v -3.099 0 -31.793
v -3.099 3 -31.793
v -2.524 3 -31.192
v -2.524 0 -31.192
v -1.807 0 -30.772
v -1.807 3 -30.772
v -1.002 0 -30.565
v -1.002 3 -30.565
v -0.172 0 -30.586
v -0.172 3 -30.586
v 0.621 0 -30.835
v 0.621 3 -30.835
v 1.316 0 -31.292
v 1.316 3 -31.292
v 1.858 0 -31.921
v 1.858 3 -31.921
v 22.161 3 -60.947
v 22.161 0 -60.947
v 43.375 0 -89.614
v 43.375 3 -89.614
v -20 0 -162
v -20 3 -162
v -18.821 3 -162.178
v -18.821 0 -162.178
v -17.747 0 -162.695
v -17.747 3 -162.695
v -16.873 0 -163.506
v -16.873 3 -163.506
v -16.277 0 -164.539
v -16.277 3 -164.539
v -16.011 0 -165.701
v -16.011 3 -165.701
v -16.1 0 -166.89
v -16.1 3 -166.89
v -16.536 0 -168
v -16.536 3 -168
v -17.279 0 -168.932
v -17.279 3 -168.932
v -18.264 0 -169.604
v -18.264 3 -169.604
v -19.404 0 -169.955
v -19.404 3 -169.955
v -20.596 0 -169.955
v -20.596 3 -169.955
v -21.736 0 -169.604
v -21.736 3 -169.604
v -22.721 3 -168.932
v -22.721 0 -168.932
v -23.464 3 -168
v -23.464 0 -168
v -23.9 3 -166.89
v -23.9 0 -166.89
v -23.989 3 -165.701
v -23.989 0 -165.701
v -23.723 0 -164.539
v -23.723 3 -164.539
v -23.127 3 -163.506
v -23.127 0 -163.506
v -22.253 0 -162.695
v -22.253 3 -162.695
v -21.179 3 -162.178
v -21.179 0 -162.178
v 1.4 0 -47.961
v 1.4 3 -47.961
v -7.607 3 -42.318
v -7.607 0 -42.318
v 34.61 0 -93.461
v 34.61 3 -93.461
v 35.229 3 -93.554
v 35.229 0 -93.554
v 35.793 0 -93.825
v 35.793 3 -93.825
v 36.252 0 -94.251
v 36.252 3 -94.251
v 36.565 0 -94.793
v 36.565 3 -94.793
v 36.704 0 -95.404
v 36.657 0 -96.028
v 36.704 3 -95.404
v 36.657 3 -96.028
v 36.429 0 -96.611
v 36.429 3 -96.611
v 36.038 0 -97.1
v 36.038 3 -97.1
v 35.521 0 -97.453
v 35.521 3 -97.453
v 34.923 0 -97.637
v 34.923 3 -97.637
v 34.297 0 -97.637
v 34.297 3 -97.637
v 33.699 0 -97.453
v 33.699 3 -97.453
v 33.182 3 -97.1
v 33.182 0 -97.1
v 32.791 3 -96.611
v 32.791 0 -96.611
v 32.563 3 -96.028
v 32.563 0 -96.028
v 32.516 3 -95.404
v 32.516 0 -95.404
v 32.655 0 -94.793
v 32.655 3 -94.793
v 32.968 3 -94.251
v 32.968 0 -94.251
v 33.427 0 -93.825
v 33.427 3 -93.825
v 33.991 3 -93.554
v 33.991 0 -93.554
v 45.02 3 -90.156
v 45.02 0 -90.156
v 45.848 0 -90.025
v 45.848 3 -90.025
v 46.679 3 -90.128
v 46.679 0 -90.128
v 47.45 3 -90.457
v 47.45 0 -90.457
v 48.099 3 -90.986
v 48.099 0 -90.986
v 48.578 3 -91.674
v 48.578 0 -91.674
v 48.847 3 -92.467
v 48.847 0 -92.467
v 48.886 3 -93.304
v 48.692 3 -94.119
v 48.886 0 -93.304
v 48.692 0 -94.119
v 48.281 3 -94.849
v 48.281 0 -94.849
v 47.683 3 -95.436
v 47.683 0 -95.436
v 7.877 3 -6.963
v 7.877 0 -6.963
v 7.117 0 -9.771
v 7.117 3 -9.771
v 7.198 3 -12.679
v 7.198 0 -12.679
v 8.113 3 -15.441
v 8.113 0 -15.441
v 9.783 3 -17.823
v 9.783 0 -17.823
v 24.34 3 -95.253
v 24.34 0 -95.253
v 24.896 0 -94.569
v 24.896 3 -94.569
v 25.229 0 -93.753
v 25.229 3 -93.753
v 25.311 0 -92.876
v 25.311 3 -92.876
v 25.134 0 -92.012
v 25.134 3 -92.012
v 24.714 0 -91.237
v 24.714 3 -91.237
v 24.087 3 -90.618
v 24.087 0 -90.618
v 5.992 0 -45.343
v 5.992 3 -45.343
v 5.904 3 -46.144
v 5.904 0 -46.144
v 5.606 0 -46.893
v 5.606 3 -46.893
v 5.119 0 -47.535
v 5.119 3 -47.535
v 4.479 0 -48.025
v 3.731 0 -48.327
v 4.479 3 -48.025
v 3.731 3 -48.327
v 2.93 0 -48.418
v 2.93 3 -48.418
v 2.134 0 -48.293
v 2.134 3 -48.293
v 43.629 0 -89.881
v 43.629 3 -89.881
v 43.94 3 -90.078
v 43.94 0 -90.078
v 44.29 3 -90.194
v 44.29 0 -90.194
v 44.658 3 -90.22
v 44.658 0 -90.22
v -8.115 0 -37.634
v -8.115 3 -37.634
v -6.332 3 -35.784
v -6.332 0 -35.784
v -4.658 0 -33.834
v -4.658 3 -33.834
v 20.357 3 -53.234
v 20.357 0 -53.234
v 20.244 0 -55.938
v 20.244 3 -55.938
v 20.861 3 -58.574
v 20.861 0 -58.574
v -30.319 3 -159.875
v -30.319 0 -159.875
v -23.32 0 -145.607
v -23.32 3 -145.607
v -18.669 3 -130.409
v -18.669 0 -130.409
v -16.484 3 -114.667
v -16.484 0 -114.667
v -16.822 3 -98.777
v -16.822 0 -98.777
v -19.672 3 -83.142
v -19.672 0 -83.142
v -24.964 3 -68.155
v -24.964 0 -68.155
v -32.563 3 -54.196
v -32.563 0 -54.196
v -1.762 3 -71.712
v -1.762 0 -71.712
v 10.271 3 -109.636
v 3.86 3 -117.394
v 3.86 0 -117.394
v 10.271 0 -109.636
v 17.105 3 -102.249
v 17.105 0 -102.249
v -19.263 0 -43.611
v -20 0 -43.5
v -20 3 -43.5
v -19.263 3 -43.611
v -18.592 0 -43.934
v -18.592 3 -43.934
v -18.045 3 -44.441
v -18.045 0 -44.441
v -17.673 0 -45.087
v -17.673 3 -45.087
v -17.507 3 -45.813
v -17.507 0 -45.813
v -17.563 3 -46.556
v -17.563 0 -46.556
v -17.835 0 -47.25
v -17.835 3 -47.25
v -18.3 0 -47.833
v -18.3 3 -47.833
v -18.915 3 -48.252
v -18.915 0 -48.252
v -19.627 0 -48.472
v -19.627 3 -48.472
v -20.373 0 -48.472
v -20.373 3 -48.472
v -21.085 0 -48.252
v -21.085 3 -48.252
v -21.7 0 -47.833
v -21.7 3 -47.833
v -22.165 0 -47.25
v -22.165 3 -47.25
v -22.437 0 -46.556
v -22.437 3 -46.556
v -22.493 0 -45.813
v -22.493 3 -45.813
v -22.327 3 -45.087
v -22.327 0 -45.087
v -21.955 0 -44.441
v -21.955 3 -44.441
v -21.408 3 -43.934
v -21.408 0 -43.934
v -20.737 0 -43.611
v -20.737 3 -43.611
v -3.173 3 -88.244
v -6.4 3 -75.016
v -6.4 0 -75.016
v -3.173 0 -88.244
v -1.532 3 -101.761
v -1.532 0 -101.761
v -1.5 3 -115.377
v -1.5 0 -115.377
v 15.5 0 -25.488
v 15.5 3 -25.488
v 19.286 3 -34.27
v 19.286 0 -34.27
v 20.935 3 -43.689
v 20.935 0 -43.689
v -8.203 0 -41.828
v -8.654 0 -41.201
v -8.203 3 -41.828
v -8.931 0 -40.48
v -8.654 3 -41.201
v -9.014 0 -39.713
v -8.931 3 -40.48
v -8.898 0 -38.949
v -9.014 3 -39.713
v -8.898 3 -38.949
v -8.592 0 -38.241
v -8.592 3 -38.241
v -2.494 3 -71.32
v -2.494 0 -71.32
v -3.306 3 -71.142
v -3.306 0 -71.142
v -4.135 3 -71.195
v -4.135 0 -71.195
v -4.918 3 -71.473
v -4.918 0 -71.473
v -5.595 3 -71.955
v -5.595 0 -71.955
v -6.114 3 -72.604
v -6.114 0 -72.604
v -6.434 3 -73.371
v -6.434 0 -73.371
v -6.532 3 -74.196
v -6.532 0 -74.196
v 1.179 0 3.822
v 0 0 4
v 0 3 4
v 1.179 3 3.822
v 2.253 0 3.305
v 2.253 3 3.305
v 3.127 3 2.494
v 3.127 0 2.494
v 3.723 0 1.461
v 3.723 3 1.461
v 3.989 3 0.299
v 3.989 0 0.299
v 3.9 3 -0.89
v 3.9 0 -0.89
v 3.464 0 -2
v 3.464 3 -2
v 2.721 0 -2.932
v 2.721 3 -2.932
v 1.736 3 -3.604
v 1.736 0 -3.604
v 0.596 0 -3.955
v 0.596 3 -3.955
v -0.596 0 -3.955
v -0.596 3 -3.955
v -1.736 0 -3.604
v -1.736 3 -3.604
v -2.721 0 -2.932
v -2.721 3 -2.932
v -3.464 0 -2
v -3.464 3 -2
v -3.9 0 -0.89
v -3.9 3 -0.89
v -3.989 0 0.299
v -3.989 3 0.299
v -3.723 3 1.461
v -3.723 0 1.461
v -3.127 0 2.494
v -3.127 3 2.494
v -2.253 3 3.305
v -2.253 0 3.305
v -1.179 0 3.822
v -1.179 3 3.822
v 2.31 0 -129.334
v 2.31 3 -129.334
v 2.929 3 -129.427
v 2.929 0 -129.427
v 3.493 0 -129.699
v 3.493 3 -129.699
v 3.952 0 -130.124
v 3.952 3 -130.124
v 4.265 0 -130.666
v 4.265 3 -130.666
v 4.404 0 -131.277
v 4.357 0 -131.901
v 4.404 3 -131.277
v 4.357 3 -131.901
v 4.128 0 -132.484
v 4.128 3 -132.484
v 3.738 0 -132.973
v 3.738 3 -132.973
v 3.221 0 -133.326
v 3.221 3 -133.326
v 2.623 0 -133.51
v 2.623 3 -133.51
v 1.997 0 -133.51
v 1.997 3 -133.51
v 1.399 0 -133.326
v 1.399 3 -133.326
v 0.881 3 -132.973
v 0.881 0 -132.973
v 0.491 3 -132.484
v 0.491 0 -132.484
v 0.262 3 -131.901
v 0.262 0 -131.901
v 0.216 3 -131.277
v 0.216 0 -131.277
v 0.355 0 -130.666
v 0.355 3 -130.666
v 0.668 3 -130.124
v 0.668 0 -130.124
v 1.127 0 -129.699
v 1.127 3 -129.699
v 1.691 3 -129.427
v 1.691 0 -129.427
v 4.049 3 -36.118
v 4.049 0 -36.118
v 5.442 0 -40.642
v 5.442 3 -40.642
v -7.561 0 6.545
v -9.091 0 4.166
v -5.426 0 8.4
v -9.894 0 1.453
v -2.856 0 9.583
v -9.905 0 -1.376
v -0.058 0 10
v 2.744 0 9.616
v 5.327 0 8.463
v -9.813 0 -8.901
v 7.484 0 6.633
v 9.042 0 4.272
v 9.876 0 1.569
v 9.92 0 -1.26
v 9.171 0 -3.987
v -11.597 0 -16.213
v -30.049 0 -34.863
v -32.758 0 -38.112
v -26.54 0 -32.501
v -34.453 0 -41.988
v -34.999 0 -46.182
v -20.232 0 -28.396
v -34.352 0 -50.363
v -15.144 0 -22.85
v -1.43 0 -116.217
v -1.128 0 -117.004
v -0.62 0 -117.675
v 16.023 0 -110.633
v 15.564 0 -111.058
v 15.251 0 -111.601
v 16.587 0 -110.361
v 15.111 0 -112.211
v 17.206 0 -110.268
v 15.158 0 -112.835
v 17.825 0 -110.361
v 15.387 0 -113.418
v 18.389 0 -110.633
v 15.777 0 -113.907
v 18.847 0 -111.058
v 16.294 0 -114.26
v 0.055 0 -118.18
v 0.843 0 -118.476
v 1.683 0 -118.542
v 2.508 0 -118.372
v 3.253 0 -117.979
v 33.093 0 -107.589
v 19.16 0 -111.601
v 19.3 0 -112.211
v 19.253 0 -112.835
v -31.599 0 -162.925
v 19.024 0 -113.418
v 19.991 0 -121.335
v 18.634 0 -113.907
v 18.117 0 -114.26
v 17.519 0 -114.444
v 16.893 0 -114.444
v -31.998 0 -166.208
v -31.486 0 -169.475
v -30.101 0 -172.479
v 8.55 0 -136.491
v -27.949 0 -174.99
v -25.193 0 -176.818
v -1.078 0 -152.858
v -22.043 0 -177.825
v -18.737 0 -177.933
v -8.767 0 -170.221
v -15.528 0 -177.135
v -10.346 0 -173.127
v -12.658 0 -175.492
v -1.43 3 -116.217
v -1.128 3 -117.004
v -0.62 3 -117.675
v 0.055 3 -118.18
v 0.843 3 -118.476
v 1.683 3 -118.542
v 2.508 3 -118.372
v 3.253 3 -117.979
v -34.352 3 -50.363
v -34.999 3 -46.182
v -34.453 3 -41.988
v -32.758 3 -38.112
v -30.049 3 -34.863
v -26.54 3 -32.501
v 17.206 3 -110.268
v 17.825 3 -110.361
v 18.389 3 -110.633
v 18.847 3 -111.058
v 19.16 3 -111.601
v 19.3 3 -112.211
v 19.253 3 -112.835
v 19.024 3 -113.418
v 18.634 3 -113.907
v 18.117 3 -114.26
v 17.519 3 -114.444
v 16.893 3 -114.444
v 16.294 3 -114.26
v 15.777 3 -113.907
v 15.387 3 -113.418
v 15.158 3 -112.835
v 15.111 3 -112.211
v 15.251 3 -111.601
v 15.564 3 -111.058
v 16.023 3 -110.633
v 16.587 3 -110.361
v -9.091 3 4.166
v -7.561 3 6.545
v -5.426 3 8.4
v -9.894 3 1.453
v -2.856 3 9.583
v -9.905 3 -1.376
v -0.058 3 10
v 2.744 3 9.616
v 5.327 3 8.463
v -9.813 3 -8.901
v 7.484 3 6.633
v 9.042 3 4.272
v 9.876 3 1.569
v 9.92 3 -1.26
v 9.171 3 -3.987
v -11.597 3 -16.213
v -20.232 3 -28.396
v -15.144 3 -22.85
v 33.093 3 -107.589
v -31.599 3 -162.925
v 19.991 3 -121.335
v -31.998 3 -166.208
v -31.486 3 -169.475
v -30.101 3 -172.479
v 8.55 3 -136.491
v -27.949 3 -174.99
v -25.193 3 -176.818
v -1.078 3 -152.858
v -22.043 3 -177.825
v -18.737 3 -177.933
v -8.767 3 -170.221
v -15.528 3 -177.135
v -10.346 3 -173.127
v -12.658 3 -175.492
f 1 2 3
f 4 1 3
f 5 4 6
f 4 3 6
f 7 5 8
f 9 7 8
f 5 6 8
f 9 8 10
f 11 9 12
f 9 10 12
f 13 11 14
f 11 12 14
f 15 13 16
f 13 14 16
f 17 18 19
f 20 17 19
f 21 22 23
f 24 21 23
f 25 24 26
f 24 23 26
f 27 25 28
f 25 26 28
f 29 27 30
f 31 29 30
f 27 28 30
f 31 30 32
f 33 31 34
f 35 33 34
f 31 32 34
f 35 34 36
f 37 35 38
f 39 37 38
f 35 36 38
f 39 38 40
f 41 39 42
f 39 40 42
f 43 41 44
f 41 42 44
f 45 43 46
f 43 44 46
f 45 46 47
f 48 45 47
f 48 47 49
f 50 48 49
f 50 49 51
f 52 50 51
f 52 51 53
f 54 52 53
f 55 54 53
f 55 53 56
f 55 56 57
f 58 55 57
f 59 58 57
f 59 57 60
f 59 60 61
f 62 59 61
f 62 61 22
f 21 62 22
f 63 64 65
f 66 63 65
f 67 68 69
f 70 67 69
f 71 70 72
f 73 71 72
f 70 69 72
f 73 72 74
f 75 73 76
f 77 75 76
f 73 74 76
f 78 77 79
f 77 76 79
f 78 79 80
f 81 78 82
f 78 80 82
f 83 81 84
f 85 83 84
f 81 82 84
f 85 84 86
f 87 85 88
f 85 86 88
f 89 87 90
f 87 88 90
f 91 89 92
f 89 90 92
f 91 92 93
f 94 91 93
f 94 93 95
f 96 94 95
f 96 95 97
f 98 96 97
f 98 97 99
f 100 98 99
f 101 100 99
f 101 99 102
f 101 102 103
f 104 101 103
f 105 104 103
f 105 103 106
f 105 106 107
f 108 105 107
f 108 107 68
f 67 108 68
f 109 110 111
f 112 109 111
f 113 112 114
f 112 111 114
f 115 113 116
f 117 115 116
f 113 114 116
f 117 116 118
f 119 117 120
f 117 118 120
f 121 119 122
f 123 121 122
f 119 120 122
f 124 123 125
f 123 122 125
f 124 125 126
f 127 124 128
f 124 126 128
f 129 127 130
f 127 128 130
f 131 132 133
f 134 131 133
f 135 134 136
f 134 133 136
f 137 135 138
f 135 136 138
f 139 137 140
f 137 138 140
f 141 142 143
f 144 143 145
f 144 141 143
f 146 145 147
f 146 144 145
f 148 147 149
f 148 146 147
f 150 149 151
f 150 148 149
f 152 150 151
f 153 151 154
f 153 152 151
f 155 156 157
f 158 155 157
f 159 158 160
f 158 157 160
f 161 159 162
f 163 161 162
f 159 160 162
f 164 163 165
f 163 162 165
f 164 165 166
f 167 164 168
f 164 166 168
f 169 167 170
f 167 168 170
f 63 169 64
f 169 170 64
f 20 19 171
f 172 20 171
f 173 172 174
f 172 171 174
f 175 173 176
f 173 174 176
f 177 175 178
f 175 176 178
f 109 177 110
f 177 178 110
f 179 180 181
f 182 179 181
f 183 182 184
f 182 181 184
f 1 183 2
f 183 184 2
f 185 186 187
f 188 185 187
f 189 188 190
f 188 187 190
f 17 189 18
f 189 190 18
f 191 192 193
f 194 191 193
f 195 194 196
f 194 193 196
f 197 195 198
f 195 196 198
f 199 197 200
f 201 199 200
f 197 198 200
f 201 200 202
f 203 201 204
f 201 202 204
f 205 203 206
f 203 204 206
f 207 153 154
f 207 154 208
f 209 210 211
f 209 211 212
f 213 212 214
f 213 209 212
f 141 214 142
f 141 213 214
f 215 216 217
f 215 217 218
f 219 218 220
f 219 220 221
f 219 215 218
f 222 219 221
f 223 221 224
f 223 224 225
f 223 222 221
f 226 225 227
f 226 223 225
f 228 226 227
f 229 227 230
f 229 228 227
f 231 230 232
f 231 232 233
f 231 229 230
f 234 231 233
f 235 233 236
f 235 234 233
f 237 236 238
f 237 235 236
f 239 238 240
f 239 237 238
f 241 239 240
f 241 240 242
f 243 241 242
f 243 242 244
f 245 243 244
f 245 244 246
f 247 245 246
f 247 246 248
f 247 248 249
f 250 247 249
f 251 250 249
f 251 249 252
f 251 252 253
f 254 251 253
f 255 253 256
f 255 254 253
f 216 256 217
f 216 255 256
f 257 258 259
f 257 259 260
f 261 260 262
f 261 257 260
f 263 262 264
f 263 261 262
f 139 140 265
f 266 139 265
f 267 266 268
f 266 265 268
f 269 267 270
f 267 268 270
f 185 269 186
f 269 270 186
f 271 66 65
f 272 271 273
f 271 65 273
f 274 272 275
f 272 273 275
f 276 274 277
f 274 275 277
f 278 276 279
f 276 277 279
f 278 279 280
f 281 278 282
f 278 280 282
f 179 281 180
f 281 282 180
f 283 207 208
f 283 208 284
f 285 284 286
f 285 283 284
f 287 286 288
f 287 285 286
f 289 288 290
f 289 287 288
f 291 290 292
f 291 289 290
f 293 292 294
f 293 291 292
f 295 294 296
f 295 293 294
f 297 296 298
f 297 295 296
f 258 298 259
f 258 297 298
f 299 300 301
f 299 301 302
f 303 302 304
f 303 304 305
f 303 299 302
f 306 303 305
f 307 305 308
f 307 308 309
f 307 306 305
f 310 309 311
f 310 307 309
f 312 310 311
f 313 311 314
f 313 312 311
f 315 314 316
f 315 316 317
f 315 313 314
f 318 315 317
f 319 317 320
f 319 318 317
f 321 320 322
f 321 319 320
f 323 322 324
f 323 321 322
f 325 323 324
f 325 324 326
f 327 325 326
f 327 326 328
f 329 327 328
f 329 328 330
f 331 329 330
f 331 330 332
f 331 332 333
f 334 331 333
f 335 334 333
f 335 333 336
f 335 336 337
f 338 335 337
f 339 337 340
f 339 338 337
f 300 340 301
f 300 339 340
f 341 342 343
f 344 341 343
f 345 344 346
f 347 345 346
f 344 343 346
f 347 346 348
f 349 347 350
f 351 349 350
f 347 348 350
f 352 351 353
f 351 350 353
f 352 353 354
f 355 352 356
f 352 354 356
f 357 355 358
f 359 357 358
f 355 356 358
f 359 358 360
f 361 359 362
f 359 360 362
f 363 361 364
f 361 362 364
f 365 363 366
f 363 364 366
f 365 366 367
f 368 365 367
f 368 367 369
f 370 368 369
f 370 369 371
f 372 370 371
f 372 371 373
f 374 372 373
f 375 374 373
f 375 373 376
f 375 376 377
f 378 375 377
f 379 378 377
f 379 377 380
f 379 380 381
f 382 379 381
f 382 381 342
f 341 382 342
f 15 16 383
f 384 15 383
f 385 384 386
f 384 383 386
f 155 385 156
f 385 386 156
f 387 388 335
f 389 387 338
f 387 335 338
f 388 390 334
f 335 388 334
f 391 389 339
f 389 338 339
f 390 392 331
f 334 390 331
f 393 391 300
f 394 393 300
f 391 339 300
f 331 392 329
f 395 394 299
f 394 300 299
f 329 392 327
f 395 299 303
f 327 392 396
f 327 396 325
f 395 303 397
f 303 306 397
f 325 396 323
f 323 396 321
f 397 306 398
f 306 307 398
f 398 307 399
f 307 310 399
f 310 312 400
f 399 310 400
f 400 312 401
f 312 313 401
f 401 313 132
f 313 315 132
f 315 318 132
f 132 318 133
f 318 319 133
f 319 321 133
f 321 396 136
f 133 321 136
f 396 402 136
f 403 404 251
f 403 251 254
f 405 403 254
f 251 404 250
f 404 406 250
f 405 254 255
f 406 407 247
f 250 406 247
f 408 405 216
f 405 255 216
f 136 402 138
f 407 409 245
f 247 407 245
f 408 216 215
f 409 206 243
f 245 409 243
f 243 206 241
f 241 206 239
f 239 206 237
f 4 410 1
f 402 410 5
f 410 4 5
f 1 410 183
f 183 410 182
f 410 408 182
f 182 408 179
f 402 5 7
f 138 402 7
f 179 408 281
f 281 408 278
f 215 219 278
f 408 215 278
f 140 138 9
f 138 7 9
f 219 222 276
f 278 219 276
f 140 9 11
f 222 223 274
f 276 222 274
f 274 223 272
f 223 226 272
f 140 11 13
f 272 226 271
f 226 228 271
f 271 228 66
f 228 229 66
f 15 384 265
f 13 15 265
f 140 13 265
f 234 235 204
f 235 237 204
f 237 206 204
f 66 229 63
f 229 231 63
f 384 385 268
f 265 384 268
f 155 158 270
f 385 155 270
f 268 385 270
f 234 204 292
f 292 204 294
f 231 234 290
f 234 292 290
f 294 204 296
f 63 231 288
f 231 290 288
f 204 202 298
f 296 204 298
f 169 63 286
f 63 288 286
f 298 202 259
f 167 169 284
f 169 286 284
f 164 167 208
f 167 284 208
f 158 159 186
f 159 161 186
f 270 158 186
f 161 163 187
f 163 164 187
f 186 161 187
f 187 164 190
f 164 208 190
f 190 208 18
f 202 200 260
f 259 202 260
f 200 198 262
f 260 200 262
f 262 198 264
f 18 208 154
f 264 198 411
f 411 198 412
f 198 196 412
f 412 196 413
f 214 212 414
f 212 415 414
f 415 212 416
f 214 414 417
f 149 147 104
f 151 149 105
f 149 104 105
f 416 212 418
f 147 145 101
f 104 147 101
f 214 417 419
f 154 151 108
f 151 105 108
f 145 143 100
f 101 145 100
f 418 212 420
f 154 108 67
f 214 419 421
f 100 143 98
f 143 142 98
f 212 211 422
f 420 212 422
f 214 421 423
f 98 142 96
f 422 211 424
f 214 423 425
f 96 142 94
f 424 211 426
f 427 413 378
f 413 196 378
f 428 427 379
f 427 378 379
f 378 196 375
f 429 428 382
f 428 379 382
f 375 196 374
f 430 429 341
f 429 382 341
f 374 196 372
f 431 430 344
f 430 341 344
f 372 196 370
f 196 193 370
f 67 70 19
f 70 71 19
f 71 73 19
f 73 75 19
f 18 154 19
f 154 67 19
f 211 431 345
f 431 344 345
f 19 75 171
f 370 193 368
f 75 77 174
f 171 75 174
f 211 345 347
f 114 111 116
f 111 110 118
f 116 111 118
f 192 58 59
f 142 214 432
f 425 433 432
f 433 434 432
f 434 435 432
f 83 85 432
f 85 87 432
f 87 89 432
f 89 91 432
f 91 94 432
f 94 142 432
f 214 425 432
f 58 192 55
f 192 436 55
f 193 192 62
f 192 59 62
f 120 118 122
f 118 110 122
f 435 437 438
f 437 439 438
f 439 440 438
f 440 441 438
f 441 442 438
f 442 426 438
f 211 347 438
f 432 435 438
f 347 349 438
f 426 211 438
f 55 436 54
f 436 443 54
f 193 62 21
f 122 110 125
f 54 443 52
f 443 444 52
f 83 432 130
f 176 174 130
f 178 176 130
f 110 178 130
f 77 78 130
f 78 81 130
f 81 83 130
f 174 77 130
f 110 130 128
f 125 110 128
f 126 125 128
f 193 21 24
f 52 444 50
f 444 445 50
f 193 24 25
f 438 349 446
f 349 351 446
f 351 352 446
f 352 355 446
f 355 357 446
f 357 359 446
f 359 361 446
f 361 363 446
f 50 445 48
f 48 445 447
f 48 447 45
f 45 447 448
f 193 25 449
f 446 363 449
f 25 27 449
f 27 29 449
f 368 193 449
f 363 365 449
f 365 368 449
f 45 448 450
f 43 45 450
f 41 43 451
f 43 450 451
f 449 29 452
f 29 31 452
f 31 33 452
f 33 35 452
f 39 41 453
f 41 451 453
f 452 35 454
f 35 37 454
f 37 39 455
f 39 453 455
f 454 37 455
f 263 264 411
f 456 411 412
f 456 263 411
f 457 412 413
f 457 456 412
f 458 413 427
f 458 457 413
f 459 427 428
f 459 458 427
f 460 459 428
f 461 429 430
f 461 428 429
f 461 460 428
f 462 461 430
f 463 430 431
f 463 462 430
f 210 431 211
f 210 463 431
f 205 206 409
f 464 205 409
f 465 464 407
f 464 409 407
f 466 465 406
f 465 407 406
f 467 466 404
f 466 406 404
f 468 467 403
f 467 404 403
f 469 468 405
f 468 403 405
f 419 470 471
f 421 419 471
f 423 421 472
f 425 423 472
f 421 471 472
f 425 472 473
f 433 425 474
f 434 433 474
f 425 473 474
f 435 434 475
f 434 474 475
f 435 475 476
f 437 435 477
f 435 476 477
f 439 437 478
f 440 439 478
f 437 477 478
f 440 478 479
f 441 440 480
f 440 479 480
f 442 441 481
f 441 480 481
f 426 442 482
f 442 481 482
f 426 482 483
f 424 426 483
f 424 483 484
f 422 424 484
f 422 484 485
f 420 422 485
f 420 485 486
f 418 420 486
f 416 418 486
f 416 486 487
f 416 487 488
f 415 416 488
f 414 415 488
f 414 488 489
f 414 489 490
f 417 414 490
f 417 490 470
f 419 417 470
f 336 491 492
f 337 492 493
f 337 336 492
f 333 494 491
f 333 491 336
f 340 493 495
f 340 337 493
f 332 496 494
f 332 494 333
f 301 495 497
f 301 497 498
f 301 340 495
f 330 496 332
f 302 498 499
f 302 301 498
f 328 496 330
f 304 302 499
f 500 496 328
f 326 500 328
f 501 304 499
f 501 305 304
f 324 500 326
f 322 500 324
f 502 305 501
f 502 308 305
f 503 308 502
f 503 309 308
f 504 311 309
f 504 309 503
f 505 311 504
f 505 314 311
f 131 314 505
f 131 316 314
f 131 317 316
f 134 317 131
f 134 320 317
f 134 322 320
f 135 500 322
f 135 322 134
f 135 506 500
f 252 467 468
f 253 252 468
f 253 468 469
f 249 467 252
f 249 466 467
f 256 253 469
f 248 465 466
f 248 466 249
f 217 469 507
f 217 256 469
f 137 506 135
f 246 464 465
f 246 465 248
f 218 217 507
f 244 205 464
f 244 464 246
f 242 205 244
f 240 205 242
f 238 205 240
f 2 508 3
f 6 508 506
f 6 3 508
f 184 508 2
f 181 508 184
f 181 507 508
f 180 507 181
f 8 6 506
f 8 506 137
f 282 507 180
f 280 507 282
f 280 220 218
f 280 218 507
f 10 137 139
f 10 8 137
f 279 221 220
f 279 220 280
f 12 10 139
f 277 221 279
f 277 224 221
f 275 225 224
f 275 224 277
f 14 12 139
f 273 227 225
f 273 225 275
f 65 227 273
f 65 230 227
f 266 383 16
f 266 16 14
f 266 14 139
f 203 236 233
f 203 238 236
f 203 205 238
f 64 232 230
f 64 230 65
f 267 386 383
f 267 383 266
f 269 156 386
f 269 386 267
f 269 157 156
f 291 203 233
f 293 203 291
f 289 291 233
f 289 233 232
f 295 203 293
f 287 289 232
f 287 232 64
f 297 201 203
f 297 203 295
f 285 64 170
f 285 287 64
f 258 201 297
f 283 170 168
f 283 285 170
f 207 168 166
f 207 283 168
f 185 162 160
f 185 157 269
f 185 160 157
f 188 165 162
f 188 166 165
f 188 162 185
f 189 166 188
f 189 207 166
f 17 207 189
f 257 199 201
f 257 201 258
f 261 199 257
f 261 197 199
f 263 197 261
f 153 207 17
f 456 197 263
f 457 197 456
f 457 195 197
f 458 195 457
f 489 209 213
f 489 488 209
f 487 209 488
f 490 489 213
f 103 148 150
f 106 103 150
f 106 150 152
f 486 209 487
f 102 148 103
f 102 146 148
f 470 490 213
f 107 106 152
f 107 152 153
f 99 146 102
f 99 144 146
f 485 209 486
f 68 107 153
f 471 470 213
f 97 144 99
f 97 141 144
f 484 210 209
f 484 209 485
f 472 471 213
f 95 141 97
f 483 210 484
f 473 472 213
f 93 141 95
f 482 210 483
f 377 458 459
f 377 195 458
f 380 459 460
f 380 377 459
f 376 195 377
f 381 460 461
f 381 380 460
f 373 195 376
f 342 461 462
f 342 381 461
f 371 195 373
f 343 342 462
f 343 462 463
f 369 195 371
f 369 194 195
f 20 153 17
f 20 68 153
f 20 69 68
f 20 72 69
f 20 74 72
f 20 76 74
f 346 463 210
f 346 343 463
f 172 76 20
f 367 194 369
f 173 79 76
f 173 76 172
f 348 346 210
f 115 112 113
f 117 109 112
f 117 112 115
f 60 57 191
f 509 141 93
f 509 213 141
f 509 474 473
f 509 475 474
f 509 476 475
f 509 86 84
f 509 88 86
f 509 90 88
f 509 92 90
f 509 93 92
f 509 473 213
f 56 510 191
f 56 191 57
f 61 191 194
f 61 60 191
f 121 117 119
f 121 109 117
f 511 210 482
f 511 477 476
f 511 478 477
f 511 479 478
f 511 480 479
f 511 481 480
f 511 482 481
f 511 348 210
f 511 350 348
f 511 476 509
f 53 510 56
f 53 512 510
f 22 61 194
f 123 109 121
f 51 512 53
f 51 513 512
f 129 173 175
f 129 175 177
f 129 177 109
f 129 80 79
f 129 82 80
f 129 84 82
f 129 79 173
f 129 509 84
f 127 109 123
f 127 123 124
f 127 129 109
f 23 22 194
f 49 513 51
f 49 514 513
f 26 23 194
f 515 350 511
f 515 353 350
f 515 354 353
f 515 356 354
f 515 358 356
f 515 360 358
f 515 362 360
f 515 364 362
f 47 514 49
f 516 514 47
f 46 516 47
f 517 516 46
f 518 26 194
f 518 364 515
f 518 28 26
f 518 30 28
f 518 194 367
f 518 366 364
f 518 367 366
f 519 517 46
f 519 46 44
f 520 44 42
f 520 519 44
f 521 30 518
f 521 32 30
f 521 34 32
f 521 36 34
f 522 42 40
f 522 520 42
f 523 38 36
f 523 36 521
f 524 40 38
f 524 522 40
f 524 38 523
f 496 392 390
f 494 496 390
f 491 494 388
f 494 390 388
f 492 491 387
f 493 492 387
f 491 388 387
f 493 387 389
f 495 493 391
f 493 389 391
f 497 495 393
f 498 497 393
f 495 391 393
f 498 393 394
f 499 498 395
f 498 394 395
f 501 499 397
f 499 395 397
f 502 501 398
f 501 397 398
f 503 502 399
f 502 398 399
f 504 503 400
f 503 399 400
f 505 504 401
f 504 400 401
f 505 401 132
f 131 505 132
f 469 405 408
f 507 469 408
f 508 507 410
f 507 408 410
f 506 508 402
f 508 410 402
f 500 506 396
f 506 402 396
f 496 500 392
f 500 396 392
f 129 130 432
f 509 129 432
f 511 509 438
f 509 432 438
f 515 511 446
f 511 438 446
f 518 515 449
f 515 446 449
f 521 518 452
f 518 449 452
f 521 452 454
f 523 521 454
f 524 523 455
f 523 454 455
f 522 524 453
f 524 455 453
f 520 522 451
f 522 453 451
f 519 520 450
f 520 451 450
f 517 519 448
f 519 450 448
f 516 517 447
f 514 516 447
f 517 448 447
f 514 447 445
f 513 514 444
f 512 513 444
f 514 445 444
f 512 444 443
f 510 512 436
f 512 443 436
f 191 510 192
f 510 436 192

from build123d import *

# Parameters (mm, degrees)
SKETCH1_R           = 4
SKETCH1_R_2         = 2.5
BOSS_EXTRUDE2_DEPTH = 3
CUT_EXTRUDE2_REACH  = 186.619
SKETCH2_R           = 4
CUT_EXTRUDE3_REACH  = 186.619
SKETCH3_R           = 2.1


with BuildPart() as part:
    # Sketch1 → Boss-Extrude2 (new body)
    with BuildSketch(Plane(origin=(0, 0, 0), x_dir=(1, 0, 0), z_dir=(0, 1, 0))):
        with BuildLine():
            Line((9.170700563, 3.987261114), (7.876862883, 6.963087778))
            ThreePointArc((7.876862883, 6.963087778), (7.198186925, 12.679447551), (9.783335319, 17.822829502))
            ThreePointArc((9.783335319, 17.822829502), (19.286109016, 34.269627525), (20.356745206, 53.234163146))
            ThreePointArc((20.356745206, 53.234163146), (20.462846426, 57.276901224), (22.161434095, 60.947022282))
            Line((22.161434095, 60.947022282), (43.375248586, 89.614346273))
            ThreePointArc((43.375248586, 89.614346273), (44.111659282, 90.146760278), (45.020325467, 90.156307579))
            ThreePointArc((45.020325467, 90.156307579), (48.577517121, 91.673723777), (47.683482049, 95.43628483))
            ThreePointArc((47.683482049, 95.43628483), (14.052723286, 128.748405766), (-8.766929777, 170.221153086))
            ThreePointArc((-8.766929777, 170.221153086), (-25.192986973, 176.818173889), (-30.319391627, 159.875446429))
            ThreePointArc((-30.319391627, 159.875446429), (-16.336845375, 106.715190551), (-32.562737633, 54.196195652))
            ThreePointArc((-32.562737633, 54.196195652), (-34.453402431, 41.987624374), (-26.539917992, 32.500760293))
            ThreePointArc((-26.539917992, 32.500760293), (-13.161486595, 19.643005303), (-9.904938494, 1.37557022))
            ThreePointArc((-9.904938494, 1.37557022), (1.356469191, -9.907572424), (9.170700563, 3.987261114))
        make_face()
        with Locations(Location((0, 0, 0), (0, 0, 270))):
            Circle(SKETCH1_R, mode=Mode.SUBTRACT)
        with Locations(Location((-20, 46, 0), (0, 0, 270))):
            Circle(SKETCH1_R_2, mode=Mode.SUBTRACT)
    extrude(amount=BOSS_EXTRUDE2_DEPTH)

    # Sketch2 → Cut-Extrude2 (cut, up to next)
    with BuildSketch(Plane(origin=(0, 3, 0), x_dir=(1, 0, 0), z_dir=(0, 1, 0)), mode=Mode.PRIVATE) as cut_extrude2_sk1:
        with Locations(Location((-20, 166, 0), (0, 0, 270))):
            Circle(SKETCH2_R)
    cut_extrude2_tool1 = extrude(cut_extrude2_sk1.sketch, amount=-CUT_EXTRUDE2_REACH, mode=Mode.PRIVATE) & part.part
    # Sketch2 → Cut-Extrude2 (cut, up to next)
    with BuildSketch(Plane(origin=(0, 3, 0), x_dir=(1, 0, 0), z_dir=(0, 1, 0)), mode=Mode.PRIVATE) as cut_extrude2_sk2:
        with BuildLine():
            Line((24.08650635, 90.617794829), (-1.761817511, 71.71243196))
            ThreePointArc((-1.761817511, 71.71243196), (-5.273300355, 71.690348613), (-6.400182005, 75.01617741))
            ThreePointArc((-6.400182005, 75.01617741), (-2.152471882, 94.978495294), (-1.500425627, 115.37731909))
            ThreePointArc((-1.500425627, 115.37731909), (0.438343778, 118.355781743), (3.85956825, 117.393861946))
            ThreePointArc((3.85956825, 117.393861946), (13.636229053, 105.89490145), (24.339781746, 95.253325031))
            ThreePointArc((24.339781746, 95.253325031), (25.310999303, 92.875575481), (24.08650635, 90.617794829))
        make_face()
    cut_extrude2_tool2 = extrude(cut_extrude2_sk2.sketch, amount=-CUT_EXTRUDE2_REACH, mode=Mode.PRIVATE) & part.part
    # Sketch2 → Cut-Extrude2 (cut, up to next)
    with BuildSketch(Plane(origin=(0, 3, 0), x_dir=(1, 0, 0), z_dir=(0, 1, 0)), mode=Mode.PRIVATE) as cut_extrude2_sk3:
        with BuildLine():
            Line((1.399941693, 47.961192116), (-7.607238393, 42.3183015))
            ThreePointArc((-7.607238393, 42.3183015), (-8.997062251, 40.099202055), (-8.114849087, 37.633900322))
            ThreePointArc((-8.114849087, 37.633900322), (-5.481535576, 34.820910528), (-3.098522666, 31.792957242))
            ThreePointArc((-3.098522666, 31.792957242), (-0.586190052, 30.546672377), (1.858342535, 31.921191043))
            ThreePointArc((1.858342535, 31.921191043), (4.848412053, 38.347783431), (5.991700338, 45.343103105))
            ThreePointArc((5.991700338, 45.343103105), (4.478604072, 48.025038621), (1.399941693, 47.961192116))
        make_face()
    cut_extrude2_tool3 = extrude(cut_extrude2_sk3.sketch, amount=-CUT_EXTRUDE2_REACH, mode=Mode.PRIVATE) & part.part
    add(cut_extrude2_tool1.solids().sort_by_distance((-20, 3, -166))[0], mode=Mode.SUBTRACT)
    add(cut_extrude2_tool2.solids().sort_by_distance((6.92649, 3, -93.946856))[0], mode=Mode.SUBTRACT)
    add(cut_extrude2_tool3.solids().sort_by_distance((-0.710411, 3, -39.721946))[0], mode=Mode.SUBTRACT)

    # Sketch3 → Cut-Extrude3 (cut, up to next)
    with BuildSketch(Plane(origin=(0, 3, 0), x_dir=(1, 0, 0), z_dir=(0, 1, 0)), mode=Mode.PRIVATE) as cut_extrude3_sk1:
        with Locations(Location((2.309703224, 131.433631836, 0), (0, 0, 270))):
            Circle(SKETCH3_R)
    cut_extrude3_tool1 = extrude(cut_extrude3_sk1.sketch, amount=-CUT_EXTRUDE3_REACH, mode=Mode.PRIVATE) & part.part
    # Sketch3 → Cut-Extrude3 (cut, up to next)
    with BuildSketch(Plane(origin=(0, 3, 0), x_dir=(1, 0, 0), z_dir=(0, 1, 0)), mode=Mode.PRIVATE) as cut_extrude3_sk2:
        with Locations(Location((34.609964816, 95.56055708, 0), (0, 0, 270))):
            Circle(SKETCH3_R)
    cut_extrude3_tool2 = extrude(cut_extrude3_sk2.sketch, amount=-CUT_EXTRUDE3_REACH, mode=Mode.PRIVATE) & part.part
    # Sketch3 → Cut-Extrude3 (cut, up to next)
    with BuildSketch(Plane(origin=(0, 3, 0), x_dir=(1, 0, 0), z_dir=(0, 1, 0)), mode=Mode.PRIVATE) as cut_extrude3_sk3:
        with Locations(Location((17.205589144, 112.367767299, 0), (0, 0, 270))):
            Circle(SKETCH3_R)
    cut_extrude3_tool3 = extrude(cut_extrude3_sk3.sketch, amount=-CUT_EXTRUDE3_REACH, mode=Mode.PRIVATE) & part.part
    add(cut_extrude3_tool1.solids().sort_by_distance((2.309703, 3, -131.433632))[0], mode=Mode.SUBTRACT)
    add(cut_extrude3_tool2.solids().sort_by_distance((34.609965, 3, -95.560557))[0], mode=Mode.SUBTRACT)
    add(cut_extrude3_tool3.solids().sort_by_distance((17.205589, 3, -112.367767))[0], mode=Mode.SUBTRACT)


solid = part.part
